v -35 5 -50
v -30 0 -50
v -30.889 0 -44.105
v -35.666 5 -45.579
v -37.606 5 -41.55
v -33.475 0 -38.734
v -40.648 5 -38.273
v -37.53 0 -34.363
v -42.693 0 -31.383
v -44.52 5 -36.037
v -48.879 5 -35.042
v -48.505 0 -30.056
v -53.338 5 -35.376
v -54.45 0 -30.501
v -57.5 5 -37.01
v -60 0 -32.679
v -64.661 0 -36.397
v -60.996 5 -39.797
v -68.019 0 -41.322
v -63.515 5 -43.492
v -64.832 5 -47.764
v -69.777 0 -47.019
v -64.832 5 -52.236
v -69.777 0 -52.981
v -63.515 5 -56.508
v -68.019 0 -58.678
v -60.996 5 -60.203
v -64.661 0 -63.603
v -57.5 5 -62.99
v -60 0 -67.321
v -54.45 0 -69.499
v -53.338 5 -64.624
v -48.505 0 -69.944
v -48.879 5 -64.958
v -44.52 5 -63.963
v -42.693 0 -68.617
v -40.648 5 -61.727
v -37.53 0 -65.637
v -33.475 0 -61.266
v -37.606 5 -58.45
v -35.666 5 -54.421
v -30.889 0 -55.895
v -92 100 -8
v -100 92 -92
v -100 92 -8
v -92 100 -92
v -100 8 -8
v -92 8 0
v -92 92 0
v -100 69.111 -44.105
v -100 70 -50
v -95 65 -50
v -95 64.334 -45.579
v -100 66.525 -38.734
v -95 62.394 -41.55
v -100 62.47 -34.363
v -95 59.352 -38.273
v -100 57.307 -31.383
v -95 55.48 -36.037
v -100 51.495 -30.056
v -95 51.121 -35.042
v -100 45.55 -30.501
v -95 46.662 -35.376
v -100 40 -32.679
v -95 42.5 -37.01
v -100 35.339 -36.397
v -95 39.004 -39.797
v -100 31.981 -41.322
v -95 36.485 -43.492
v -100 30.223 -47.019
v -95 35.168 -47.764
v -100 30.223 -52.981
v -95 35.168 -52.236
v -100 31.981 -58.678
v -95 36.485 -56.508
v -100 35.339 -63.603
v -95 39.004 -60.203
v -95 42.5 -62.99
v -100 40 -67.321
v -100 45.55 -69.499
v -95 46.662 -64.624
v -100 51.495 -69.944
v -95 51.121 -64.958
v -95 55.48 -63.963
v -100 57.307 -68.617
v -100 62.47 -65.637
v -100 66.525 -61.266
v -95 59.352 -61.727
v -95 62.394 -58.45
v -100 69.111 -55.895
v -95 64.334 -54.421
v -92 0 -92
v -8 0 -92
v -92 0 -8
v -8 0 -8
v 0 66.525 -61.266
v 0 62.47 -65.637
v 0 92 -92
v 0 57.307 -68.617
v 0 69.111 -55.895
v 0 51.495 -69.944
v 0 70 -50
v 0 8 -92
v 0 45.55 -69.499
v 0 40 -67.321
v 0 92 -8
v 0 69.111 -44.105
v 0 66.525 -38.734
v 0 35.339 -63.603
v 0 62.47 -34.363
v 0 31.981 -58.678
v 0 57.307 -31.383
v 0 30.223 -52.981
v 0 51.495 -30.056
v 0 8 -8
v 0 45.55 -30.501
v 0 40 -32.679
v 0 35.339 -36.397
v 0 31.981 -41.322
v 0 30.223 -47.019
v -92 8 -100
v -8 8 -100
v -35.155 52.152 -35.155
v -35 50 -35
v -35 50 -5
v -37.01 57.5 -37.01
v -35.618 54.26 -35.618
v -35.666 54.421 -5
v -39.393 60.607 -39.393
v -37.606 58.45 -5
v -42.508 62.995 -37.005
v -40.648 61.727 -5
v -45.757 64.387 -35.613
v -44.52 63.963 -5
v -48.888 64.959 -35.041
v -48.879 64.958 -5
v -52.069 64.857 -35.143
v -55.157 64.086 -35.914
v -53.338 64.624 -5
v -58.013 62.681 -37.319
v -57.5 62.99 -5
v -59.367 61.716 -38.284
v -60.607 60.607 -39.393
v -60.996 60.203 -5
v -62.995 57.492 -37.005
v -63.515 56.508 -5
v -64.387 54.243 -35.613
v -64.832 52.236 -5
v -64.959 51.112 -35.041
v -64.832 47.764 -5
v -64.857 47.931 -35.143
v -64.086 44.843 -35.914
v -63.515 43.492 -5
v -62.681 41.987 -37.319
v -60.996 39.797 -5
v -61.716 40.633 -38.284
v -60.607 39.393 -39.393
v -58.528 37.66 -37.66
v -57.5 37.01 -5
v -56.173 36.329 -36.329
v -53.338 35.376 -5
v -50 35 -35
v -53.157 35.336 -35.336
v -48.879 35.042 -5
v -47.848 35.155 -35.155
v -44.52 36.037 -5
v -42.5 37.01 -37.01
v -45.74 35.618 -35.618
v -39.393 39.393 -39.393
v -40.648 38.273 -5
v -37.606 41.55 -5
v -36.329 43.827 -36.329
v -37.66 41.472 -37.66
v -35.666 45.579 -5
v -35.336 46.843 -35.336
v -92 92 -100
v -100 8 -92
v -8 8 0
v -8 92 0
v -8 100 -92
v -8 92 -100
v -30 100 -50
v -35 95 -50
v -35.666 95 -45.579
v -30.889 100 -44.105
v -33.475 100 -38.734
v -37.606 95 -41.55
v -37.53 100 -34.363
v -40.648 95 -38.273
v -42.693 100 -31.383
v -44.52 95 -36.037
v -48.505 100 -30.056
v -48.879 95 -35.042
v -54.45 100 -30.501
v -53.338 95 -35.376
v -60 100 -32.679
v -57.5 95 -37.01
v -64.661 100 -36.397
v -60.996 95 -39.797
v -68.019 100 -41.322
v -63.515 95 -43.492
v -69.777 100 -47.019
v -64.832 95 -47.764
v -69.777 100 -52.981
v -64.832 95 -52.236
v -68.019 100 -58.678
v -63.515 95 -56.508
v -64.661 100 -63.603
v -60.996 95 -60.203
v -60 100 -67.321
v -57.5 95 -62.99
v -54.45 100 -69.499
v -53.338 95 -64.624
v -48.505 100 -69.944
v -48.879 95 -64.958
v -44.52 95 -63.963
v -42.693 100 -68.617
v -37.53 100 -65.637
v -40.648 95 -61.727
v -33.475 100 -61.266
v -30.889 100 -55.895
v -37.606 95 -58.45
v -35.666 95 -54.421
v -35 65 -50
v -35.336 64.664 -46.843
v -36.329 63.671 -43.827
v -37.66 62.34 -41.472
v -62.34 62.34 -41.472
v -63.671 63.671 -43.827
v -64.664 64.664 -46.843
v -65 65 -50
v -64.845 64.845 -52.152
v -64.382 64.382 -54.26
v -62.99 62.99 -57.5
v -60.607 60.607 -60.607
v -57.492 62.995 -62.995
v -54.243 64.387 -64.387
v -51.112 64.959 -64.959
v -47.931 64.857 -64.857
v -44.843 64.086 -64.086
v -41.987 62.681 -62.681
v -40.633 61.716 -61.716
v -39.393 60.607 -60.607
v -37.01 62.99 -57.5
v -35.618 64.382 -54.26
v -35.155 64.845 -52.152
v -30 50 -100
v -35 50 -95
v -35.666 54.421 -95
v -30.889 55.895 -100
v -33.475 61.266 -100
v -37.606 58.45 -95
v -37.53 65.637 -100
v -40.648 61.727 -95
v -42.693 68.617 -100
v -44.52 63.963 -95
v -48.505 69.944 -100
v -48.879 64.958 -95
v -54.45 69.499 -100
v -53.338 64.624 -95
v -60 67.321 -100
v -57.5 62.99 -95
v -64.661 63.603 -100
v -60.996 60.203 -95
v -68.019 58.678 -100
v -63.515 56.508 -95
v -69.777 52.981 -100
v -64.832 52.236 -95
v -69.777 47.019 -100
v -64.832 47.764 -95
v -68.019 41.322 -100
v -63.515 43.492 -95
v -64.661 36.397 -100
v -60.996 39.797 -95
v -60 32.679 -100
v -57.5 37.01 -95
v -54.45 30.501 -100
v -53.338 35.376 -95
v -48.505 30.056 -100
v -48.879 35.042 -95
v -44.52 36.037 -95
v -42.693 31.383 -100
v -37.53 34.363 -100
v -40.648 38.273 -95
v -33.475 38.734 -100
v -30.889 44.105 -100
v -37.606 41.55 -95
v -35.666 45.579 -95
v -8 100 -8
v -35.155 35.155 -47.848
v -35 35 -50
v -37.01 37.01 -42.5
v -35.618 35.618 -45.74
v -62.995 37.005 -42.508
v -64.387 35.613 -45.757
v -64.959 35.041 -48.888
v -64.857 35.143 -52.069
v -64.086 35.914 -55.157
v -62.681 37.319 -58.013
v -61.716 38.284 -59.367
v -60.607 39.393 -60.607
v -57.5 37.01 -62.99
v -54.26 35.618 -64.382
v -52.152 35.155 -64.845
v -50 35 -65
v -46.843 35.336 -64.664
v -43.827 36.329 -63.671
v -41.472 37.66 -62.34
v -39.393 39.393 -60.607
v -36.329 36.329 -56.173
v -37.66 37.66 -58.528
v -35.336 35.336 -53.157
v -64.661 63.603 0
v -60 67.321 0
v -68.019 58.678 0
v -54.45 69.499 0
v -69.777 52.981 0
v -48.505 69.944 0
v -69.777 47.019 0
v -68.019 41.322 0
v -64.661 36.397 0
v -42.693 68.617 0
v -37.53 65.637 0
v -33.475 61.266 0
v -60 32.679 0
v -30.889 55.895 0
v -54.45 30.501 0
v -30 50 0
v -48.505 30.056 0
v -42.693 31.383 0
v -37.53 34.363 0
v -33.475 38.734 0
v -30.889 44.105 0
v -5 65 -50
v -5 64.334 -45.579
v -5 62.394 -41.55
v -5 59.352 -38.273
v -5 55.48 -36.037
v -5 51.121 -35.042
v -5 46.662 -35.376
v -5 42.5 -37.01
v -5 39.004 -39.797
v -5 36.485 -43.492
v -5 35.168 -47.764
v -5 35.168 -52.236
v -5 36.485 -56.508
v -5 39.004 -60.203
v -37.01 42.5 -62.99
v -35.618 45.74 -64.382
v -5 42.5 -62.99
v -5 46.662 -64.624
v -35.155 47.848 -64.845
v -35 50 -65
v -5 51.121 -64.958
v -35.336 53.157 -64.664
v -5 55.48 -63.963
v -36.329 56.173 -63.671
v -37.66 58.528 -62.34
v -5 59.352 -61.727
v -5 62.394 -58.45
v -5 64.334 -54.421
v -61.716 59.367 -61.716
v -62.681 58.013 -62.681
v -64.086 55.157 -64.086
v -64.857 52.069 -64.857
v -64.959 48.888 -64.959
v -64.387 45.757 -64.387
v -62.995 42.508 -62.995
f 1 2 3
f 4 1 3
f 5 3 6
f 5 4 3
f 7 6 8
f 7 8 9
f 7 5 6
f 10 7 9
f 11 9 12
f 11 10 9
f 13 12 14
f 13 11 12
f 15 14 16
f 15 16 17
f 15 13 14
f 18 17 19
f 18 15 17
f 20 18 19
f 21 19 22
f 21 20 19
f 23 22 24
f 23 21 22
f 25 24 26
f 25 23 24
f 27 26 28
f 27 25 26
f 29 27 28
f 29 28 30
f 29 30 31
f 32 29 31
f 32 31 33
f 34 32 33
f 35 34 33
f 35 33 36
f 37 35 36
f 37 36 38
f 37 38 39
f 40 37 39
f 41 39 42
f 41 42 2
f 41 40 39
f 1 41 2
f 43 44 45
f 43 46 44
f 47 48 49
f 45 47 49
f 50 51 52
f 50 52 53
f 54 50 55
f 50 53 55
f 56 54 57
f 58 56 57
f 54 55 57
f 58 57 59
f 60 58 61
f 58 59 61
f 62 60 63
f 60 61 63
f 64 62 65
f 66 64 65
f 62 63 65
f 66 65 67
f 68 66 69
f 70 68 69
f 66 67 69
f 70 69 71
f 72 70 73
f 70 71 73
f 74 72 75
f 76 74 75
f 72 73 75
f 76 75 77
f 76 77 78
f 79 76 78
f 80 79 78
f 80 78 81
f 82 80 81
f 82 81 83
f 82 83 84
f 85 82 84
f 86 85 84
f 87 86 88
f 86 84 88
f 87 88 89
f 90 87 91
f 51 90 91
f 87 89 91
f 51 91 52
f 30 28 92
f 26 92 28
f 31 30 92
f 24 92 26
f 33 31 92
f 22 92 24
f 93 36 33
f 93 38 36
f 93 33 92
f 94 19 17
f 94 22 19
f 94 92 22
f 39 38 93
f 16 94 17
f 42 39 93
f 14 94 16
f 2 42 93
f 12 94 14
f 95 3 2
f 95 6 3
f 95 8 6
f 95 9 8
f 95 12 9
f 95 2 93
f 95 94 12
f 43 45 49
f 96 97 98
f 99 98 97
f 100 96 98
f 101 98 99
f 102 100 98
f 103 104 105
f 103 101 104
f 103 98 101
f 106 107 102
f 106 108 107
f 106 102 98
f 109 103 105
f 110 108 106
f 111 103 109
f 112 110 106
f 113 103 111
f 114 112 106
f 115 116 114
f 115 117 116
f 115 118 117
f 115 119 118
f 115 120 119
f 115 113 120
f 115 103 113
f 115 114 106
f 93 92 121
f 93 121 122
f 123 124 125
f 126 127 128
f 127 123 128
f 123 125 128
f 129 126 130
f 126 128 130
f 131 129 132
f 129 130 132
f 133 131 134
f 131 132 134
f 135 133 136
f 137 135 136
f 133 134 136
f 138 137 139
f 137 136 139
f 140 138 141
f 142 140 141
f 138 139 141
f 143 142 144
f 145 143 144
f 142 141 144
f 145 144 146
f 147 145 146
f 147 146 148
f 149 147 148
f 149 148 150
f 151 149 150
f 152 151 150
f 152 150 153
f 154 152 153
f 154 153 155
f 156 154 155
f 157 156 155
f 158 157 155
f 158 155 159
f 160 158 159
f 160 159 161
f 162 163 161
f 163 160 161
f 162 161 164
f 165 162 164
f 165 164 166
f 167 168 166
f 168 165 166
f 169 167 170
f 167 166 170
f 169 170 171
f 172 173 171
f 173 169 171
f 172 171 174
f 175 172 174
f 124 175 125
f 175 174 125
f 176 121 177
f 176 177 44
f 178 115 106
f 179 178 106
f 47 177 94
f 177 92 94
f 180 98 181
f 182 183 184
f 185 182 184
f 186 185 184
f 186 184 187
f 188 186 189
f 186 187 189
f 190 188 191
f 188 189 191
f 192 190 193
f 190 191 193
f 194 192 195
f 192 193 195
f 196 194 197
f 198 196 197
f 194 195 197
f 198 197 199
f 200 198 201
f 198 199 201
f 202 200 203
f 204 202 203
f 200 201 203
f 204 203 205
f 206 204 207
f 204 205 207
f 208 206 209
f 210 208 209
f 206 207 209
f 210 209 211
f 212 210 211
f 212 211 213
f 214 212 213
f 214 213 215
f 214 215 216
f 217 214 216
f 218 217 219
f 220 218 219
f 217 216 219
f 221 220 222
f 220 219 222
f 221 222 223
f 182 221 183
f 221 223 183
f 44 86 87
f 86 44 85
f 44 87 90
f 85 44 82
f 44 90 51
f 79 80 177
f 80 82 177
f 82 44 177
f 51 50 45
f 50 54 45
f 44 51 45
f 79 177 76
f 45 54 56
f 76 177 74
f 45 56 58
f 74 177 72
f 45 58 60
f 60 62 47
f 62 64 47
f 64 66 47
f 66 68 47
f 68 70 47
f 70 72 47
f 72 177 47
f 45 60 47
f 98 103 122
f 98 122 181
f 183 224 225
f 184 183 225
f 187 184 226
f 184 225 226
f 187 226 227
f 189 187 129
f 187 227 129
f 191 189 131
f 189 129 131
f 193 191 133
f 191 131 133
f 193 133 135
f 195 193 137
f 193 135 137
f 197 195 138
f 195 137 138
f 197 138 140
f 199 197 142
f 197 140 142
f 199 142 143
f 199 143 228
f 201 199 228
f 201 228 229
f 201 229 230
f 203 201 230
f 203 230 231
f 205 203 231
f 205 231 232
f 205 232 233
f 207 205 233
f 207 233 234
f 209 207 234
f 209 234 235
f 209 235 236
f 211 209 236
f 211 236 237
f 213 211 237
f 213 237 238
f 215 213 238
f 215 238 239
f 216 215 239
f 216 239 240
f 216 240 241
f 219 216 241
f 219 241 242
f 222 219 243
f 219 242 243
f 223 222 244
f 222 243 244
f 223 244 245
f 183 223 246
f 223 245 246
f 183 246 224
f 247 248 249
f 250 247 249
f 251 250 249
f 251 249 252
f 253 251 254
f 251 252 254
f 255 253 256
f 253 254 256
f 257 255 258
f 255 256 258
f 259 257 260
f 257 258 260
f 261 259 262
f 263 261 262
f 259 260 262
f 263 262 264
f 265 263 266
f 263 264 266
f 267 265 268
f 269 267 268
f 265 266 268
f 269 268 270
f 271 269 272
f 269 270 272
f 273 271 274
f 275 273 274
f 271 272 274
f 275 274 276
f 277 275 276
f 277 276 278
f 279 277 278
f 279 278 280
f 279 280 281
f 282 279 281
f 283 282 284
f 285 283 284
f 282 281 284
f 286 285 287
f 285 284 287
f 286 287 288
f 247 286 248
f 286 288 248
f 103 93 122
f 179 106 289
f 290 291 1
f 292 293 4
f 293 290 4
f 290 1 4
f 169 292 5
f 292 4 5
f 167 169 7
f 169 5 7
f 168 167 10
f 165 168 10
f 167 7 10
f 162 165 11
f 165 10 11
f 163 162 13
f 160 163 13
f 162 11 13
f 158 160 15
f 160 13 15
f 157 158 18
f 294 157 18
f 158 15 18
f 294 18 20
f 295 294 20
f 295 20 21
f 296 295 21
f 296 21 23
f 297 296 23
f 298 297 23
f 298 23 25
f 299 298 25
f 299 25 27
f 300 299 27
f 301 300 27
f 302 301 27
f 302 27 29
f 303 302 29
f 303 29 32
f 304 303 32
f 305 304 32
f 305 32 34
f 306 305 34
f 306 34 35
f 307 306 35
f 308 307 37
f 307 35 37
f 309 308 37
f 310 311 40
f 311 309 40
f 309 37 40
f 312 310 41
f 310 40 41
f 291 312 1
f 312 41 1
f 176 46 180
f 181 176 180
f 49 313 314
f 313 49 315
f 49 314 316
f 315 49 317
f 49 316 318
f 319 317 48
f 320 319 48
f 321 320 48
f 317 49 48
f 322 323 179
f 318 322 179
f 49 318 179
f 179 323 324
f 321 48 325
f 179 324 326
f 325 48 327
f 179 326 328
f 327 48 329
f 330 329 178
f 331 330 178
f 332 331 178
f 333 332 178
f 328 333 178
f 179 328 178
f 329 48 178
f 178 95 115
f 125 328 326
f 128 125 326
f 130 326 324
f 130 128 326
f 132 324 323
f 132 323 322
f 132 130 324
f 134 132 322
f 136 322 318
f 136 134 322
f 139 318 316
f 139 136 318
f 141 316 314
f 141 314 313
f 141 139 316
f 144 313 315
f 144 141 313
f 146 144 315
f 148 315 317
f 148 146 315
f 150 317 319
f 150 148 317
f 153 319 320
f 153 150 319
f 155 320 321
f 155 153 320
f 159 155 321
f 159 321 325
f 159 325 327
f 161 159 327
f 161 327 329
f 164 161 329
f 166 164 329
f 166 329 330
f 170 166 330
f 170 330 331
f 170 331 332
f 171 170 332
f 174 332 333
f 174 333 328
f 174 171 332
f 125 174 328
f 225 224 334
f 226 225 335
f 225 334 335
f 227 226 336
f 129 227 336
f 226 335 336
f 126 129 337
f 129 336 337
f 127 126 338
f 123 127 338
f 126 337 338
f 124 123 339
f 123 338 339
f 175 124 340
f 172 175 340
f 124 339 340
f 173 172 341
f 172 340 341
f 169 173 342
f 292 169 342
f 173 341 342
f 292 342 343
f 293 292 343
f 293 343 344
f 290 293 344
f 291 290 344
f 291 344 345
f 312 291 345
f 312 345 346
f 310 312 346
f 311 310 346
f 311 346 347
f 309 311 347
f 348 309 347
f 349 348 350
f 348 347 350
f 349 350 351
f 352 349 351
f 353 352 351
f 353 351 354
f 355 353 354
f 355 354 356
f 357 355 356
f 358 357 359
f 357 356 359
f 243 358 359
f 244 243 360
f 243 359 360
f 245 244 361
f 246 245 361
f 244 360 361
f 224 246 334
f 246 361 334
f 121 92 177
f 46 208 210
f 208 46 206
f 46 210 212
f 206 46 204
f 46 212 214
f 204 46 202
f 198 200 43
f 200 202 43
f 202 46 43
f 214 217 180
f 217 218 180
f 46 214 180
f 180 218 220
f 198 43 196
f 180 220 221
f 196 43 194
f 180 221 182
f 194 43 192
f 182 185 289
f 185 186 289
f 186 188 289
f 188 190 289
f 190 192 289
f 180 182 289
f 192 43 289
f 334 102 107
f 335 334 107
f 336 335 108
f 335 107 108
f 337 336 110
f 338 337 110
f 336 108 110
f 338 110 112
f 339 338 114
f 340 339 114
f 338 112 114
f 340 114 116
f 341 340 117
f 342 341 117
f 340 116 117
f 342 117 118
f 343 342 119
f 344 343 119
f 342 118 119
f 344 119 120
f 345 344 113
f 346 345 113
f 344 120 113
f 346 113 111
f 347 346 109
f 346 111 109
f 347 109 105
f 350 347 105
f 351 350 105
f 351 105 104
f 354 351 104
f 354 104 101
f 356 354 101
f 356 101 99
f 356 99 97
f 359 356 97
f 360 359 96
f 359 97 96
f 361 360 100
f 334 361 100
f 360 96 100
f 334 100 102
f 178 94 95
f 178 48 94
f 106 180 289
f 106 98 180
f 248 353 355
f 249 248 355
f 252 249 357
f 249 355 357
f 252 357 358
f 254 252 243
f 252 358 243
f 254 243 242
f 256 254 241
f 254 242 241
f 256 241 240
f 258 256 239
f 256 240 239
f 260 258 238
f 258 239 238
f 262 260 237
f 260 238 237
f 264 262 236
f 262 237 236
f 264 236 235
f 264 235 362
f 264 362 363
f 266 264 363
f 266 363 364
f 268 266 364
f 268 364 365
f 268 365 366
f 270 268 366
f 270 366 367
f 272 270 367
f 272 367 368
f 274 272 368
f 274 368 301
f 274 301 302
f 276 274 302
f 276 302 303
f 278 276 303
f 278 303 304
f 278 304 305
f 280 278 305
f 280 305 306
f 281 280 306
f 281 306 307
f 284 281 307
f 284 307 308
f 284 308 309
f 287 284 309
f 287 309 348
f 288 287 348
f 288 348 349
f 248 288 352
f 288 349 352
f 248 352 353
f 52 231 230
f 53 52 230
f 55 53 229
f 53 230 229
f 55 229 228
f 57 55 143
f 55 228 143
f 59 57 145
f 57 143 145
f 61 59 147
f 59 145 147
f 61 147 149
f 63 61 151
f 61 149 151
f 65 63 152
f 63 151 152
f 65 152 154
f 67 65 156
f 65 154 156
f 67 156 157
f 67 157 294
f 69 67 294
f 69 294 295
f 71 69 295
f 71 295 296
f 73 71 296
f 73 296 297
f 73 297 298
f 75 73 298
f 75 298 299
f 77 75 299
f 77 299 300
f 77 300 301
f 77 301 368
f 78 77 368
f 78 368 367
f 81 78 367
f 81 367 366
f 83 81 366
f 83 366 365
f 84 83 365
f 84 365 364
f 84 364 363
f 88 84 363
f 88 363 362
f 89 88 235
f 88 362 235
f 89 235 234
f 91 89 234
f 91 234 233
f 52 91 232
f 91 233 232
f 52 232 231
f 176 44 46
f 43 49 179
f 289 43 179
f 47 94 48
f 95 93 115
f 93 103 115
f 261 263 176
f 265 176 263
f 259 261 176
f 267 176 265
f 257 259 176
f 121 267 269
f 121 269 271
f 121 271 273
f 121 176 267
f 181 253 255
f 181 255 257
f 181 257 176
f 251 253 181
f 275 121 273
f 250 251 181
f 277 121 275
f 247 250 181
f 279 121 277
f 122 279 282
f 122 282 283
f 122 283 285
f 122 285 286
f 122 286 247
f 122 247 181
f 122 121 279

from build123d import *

# Parameters (mm, degrees)
F0_W     = 100
F0_H     = 100
F0_R     = 15
F1_DEPTH = 100
F2_R     = 15
F3_DEPTH = 300
F4_R     = 15
F5_DEPTH = 300
F6_R     = 15
F7_DEPTH = 300
F8_SIZE  = 8
F9_SIZE  = 5


with BuildPart() as f1:
    # F0 (on Front) → F1 (new body)
    with BuildSketch(Plane.XZ):
        with Locations((-50, -50)):
            Rectangle(F0_W, F0_H)
        with Locations((-50, -50)):
            Circle(F0_R, mode=Mode.SUBTRACT)
        with Locations((-50, -50)):
            Circle(F0_R)
    extrude(amount=-F1_DEPTH)

    # F2 (on face) → F3 (cut)
    with BuildSketch(Plane.YZ):
        with Locations((50, -50)):
            Circle(F2_R)
    extrude(amount=-F3_DEPTH, mode=Mode.SUBTRACT)

    # F4 (on face) → F5 (cut)
    with BuildSketch(Plane.XZ):
        with Locations((-50, -50)):
            Circle(F4_R)
    extrude(amount=-F5_DEPTH, mode=Mode.SUBTRACT)

    # F6 (on face) → F7 (cut)
    with BuildSketch(Plane.XY):
        with Locations((-50, 50)):
            Circle(F6_R)
    extrude(amount=-F7_DEPTH, mode=Mode.SUBTRACT)

    # F8
    f8_edges = [f1.edges().sort_by_distance(p)[0] for p in [
        (-50, 0, 0),
        (0, 0, -50),
        (-100, 0, -50),
        (-50, 0, -100),
        (-100, 50, 0),
        (-100, 100, -50),
        (-100, 50, -100),
        (0, 50, 0),
        (0, 100, -50),
        (0, 50, -100),
        (-50, 100, -100),
        (-50, 100, 0),
    ]]
    chamfer(f8_edges, length=F8_SIZE)

    # F9
    f9_edges = [f1.edges().sort_by_distance(p)[0] for p in [
        (-65, 0, -50),
        (0, 35, -50),
        (-65, 50, 0),
        (-100, 35, -50),
        (-65, 50, -100),
        (-65, 100, -50),
    ]]
    chamfer(f9_edges, length=F9_SIZE)


solid = f1.part
